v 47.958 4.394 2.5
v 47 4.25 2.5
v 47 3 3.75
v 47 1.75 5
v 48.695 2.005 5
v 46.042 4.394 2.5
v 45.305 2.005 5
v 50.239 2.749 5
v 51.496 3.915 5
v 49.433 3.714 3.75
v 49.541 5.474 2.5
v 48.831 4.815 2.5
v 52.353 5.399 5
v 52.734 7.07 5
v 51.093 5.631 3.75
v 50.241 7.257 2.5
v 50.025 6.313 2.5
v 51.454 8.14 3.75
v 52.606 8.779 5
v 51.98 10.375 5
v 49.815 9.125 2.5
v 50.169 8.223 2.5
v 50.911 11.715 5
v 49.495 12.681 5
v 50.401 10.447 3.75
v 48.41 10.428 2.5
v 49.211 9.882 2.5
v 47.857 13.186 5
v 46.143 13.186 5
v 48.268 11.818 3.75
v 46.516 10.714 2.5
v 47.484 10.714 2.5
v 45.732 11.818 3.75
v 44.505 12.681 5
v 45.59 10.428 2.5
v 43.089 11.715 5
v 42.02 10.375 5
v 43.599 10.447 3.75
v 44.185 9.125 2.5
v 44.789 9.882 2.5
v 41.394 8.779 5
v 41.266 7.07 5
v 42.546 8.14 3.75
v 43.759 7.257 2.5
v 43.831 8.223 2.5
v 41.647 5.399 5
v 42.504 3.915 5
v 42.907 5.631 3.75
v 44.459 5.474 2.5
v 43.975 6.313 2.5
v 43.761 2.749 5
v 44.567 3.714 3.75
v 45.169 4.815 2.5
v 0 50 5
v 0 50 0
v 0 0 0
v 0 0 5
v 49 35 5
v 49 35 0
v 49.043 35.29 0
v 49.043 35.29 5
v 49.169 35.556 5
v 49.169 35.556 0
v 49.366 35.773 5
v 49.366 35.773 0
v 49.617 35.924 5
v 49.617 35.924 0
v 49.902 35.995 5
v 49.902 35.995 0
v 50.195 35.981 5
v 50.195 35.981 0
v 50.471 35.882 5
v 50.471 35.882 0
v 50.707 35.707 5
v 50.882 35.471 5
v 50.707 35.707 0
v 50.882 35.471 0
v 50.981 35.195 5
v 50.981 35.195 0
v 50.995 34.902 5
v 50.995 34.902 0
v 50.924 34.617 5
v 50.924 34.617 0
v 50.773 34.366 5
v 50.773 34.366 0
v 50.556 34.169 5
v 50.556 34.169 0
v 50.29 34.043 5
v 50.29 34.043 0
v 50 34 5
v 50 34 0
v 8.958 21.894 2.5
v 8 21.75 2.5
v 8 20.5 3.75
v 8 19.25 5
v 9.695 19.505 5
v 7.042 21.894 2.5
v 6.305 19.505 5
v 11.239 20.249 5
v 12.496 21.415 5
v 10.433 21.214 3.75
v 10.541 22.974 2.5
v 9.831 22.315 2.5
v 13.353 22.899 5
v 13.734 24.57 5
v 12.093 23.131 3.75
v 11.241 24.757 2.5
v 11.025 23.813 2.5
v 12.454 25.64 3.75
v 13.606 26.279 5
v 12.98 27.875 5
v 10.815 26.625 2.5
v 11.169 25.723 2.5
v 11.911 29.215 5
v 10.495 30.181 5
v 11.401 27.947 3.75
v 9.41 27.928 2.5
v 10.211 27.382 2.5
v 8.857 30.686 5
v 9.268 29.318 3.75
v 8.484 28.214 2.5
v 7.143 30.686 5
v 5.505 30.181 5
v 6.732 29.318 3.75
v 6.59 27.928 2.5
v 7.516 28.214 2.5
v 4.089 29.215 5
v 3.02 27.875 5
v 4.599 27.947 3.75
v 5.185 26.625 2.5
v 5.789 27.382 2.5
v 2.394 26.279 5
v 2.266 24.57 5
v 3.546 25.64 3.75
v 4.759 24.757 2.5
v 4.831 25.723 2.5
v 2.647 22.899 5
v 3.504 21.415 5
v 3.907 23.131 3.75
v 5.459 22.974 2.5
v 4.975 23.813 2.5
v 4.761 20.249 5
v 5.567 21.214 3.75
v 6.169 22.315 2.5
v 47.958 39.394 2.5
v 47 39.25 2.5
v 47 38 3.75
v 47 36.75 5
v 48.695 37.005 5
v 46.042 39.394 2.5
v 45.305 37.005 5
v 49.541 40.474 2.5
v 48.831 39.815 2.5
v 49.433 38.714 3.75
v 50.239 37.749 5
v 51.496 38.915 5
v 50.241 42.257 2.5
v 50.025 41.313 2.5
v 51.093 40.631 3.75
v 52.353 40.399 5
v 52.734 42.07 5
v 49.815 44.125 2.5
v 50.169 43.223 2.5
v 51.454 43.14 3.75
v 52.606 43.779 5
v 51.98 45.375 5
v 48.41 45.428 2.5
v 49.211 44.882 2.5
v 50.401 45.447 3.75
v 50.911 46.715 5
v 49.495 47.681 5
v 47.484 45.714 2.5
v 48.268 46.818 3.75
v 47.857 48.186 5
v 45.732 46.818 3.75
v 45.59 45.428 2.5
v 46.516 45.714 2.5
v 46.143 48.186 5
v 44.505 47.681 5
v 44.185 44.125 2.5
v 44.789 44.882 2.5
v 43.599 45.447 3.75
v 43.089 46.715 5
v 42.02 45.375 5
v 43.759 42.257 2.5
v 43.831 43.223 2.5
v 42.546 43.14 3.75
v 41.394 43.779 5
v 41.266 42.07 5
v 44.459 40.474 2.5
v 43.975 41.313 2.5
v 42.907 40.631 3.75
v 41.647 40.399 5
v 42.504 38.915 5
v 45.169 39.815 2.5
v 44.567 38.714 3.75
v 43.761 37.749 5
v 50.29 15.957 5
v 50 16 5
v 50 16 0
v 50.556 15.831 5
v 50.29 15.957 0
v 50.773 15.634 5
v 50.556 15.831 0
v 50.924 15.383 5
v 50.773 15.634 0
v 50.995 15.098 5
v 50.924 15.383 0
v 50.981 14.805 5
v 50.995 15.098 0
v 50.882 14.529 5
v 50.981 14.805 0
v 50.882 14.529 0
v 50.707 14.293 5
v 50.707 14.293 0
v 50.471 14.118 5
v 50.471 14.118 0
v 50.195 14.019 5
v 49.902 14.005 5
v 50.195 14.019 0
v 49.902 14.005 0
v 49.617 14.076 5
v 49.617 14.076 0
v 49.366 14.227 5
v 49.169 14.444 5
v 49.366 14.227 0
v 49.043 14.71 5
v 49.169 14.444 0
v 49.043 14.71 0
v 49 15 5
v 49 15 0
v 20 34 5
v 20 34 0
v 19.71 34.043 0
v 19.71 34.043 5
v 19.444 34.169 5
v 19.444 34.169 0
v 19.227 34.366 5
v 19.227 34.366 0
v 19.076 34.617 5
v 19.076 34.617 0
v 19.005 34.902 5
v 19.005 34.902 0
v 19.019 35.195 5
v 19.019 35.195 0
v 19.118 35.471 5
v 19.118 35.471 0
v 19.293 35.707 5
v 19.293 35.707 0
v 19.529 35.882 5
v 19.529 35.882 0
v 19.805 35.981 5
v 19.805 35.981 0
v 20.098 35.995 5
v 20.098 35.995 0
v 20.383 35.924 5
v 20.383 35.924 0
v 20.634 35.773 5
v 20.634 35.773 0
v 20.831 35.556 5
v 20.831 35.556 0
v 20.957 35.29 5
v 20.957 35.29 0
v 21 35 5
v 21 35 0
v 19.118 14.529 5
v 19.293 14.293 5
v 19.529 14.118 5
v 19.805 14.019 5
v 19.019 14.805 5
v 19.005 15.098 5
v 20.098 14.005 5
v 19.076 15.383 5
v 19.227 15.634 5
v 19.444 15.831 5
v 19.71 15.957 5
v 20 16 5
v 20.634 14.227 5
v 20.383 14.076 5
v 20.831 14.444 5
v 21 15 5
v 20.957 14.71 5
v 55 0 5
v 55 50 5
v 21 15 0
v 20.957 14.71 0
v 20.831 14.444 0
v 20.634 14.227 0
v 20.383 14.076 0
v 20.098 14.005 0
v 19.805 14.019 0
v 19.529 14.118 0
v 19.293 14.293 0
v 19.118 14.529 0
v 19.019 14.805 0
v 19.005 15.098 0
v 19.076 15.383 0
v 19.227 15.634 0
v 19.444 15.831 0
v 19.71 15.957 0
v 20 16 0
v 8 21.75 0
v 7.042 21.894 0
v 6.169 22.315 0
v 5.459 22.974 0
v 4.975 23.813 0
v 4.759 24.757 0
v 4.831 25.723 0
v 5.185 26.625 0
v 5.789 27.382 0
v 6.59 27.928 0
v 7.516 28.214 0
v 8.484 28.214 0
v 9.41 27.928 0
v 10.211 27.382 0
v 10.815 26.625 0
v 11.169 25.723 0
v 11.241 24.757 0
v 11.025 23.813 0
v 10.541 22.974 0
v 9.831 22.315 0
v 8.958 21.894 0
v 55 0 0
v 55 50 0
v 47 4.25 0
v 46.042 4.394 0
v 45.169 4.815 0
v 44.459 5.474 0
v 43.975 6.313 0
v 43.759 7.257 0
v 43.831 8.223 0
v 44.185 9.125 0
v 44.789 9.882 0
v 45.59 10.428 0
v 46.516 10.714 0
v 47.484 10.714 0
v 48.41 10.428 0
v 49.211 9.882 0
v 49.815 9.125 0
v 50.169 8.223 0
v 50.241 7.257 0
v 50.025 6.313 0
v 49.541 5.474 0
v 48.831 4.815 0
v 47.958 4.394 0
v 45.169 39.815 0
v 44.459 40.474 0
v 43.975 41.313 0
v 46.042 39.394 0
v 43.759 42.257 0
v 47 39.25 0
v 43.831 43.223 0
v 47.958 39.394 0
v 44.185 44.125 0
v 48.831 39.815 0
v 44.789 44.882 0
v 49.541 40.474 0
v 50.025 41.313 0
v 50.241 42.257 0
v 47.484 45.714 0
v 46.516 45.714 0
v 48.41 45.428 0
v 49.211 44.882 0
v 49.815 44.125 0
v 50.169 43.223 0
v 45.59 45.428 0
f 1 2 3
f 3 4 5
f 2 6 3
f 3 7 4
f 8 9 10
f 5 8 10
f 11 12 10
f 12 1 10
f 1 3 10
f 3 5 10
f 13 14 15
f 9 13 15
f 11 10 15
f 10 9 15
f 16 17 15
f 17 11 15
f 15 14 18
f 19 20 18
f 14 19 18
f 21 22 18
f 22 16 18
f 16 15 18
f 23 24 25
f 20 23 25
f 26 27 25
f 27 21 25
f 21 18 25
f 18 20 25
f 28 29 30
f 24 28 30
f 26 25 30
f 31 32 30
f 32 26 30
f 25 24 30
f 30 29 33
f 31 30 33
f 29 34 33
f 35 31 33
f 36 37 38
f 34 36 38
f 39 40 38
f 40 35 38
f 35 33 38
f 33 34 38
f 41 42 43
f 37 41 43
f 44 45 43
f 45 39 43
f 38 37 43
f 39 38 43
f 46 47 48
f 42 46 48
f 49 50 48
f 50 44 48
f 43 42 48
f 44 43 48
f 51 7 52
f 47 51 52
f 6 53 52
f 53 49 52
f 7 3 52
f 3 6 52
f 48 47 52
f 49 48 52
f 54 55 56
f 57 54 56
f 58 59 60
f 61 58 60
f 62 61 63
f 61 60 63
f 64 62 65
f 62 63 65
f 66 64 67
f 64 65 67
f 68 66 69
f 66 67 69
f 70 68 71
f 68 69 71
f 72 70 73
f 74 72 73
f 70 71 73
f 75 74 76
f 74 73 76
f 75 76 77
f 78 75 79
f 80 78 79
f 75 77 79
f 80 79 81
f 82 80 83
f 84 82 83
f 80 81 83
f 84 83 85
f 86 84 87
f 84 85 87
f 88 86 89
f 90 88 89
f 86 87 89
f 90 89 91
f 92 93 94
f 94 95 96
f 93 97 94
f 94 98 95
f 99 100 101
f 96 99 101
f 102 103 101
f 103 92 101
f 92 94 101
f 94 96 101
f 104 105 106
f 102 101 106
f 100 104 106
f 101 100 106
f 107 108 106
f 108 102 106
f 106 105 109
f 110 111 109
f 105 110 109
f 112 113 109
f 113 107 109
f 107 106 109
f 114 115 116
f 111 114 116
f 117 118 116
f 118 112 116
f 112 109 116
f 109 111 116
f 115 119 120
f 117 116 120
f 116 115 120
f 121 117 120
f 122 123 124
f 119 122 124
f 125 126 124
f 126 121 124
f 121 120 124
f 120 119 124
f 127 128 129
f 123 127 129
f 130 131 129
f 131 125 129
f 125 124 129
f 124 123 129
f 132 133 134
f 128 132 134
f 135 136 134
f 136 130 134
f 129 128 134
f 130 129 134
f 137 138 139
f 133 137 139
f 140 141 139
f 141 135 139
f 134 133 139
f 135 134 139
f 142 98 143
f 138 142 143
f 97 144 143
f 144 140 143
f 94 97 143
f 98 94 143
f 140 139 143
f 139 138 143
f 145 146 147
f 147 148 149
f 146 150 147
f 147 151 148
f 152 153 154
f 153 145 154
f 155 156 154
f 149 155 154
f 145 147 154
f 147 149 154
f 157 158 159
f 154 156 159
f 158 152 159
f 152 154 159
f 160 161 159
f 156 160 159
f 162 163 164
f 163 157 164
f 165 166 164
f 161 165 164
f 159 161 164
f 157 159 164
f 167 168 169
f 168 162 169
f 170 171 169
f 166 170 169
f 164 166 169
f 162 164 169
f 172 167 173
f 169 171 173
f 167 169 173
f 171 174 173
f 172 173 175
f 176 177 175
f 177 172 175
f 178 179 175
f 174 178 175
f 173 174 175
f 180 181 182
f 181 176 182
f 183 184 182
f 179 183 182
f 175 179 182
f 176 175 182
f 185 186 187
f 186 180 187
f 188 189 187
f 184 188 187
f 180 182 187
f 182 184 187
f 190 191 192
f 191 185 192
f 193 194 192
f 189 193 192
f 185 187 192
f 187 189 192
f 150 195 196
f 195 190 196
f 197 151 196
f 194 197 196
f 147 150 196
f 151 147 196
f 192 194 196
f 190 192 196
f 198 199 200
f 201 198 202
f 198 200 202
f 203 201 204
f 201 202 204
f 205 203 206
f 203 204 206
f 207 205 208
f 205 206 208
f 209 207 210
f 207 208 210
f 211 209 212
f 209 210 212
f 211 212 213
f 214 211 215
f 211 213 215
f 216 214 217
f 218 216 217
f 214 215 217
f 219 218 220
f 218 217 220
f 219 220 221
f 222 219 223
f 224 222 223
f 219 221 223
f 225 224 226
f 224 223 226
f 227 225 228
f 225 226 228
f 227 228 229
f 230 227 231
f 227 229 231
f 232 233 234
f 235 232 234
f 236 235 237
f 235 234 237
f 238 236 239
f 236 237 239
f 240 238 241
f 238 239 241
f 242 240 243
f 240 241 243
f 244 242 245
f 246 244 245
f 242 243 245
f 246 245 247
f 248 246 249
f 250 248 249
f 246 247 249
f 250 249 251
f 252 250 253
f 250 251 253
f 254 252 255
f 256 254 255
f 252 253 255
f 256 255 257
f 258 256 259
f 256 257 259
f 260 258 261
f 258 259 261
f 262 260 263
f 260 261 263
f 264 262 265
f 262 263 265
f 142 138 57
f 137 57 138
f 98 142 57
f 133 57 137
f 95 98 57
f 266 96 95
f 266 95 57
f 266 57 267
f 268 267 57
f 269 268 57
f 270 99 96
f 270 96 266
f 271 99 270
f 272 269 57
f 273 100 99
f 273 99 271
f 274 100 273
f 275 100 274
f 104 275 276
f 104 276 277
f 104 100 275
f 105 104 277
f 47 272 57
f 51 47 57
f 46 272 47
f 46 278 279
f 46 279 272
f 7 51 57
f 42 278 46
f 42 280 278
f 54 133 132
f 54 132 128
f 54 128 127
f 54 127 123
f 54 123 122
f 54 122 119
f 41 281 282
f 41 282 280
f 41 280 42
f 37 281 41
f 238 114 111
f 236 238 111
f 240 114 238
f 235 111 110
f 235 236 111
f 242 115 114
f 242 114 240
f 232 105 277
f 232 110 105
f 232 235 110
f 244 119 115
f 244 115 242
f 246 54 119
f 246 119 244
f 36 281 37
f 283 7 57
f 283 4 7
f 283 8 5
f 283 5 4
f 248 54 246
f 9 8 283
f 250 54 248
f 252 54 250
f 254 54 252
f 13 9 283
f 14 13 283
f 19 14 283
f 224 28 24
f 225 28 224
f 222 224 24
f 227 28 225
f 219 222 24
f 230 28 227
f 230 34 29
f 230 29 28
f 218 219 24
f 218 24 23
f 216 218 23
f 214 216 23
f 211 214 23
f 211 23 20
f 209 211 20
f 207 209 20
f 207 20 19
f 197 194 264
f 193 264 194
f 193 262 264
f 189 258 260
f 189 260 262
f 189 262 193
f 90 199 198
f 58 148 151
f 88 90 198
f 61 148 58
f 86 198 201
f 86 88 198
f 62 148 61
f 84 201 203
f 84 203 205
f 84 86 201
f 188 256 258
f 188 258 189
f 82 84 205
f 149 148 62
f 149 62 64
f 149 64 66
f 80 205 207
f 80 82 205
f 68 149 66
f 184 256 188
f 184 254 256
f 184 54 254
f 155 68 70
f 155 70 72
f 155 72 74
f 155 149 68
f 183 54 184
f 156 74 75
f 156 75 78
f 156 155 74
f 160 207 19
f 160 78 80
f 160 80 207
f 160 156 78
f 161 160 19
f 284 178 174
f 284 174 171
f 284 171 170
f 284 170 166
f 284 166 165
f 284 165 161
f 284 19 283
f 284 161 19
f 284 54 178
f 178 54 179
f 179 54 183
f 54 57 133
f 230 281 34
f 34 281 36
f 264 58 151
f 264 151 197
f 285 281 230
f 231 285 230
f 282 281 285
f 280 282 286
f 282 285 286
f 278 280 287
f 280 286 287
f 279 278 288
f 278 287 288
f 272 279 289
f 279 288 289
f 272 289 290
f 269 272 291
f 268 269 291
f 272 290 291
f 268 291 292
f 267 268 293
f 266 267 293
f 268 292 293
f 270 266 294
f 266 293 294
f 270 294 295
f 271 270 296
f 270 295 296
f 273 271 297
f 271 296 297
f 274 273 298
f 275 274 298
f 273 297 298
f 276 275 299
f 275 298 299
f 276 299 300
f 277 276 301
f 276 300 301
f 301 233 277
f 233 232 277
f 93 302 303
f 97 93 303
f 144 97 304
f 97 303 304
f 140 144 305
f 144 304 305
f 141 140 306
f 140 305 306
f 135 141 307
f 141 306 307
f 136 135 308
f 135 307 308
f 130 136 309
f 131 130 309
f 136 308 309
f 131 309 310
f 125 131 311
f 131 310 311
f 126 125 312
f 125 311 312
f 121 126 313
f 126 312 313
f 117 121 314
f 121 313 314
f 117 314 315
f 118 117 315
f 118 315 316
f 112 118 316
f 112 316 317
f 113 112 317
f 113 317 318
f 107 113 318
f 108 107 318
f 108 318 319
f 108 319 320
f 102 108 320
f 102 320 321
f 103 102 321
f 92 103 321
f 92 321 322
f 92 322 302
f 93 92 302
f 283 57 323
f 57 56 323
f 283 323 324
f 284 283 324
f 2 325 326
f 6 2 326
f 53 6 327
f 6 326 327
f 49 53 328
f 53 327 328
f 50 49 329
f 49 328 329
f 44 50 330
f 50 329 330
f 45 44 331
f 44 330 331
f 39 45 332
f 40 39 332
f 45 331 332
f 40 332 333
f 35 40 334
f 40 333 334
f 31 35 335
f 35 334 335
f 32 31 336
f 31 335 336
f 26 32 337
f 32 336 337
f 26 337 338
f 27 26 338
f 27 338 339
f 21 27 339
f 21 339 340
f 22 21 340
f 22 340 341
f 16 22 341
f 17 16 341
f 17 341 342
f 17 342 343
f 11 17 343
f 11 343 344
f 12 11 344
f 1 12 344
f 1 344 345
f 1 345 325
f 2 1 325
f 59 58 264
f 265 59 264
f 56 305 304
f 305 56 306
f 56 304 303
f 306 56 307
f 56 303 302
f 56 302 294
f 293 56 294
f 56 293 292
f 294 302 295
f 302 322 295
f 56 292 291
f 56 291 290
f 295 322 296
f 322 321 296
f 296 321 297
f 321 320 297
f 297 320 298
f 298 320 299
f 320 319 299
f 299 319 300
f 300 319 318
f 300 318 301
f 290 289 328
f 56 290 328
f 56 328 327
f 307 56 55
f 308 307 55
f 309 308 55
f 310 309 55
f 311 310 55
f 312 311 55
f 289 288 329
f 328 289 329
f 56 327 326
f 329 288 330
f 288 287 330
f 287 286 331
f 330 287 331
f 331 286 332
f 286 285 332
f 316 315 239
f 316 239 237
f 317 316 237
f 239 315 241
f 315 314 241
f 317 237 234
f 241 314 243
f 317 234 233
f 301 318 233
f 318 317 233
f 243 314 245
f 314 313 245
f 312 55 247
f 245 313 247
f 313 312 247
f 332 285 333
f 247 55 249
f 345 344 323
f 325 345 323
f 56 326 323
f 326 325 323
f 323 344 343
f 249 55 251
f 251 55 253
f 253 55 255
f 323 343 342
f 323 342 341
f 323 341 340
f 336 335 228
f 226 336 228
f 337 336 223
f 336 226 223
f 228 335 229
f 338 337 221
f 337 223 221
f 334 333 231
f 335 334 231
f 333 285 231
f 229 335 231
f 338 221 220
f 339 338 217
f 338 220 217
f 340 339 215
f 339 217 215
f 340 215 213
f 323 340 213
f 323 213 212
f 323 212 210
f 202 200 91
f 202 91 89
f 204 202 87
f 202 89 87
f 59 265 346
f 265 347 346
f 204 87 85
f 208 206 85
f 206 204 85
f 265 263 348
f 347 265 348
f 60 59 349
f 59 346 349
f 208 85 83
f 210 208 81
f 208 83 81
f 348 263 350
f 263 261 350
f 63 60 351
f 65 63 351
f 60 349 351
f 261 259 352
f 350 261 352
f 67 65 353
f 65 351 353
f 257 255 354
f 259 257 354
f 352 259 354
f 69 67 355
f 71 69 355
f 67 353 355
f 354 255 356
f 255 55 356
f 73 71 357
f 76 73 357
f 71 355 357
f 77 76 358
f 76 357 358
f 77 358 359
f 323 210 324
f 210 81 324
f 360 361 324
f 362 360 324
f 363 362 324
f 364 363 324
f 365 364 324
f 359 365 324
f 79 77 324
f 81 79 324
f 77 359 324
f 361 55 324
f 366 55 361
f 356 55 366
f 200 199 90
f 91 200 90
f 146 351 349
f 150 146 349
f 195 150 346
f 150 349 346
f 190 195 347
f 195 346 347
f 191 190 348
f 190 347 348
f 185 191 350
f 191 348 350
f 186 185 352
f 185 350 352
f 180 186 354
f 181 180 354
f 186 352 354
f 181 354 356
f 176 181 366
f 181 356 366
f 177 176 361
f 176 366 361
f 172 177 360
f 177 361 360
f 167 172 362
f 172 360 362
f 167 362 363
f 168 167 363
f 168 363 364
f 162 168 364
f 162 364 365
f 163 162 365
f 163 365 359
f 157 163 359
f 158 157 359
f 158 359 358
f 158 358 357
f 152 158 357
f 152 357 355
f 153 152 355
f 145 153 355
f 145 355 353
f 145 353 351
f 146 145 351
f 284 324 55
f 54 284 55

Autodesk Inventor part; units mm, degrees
ref_plane "YZ Plane" through (0, 0, 0) normal (1, 0, 0) x (0, 1, 0)
ref_plane "XZ Plane" through (0, 0, 0) normal (0, 1, 0) x (-1, 0, 0)
ref_plane "XY Plane" through (0, 0, 0) normal (0, 0, 1) x (1, 0, 0)
sketch "Sketch1" plane through (0, 0, 0) normal (0, 0, 1) x (1, 0, 0)
  line L0 (0, 0) -> (55, 0)
  line L1 (55, 0) -> (55, 50)
  line L2 (55, 50) -> (0, 50)
  line L3 (0, 50) -> (0, 0)
  dimension "d0" = 55
  dimension "d1" = 50
extrude "Extrusion1" add sketch "Sketch1" along normal blind 5
sketch "Sketch2" plane through (0, 0, 5) normal (0, 0, 1) x (1, 0, 0)
  line L0 (55, 0) -> (0, 0) projected
  line L1 (55, 50) -> (55, 0) projected
  line L2 (20, 15) -> (50, 15)
  line L3 (50, 15) -> (50, 35)
  line L4 (50, 35) -> (20, 35)
  line L5 (20, 35) -> (20, 15)
  dimension "d4" = 30
  dimension "d5" = 20
  dimension "d6" = 5
  dimension "d7" = 15
extrude "Extrusion2" cut sketch "Sketch2" against normal blind 5
sketch "Sketch3" plane through (0, 0, 5) normal (0, 0, 1) x (1, 0, 0)
  circle A0 centre (20, 35) radius 1
  circle A1 centre (20, 15) radius 1
  circle A2 centre (50, 15) radius 1
  circle A3 centre (50, 35) radius 1
  point P0 (50, 35)
  point P1 (20, 15)
  dimension "d10" = 2
  dimension "d11" = 2
  dimension "d12" = 2
  dimension "d13" = 2
hole "Hole1" at (20, 35, 5) at (20, 15, 5) at (50, 15, 5) at (50, 35, 5) direction (0, 0, -1) diameter 2 depth 5 tip angle 118
sketch "Sketch4" plane through (0, 0, 5) normal (0, 0, 1) x (1, 0, 0)
  line L0 (0, 0) -> (0, 50) projected
  line L1 (55, 0) -> (0, 0) projected
  line L2 (55, 50) -> (55, 0) projected
  line L3 (0, 50) -> (55, 50) projected
  point P0 (8, 25)
  point P1 (47, 42.5)
  point P2 (47, 7.5)
  dimension "d21" = 35
  dimension "d22" = 7.5
  dimension "d23" = 8
  dimension "d24" = 8
  dimension "d25" = 8
  dimension "d26" = 25
hole "Hole2" at (8, 25, 5) at (47, 42.5, 5) at (47, 7.5, 5) direction (0, 0, -1) diameter 6.5 depth 5 tip angle 118 countersink diameter 11.5 countersink angle 90
properties part number "ASSOALHO(8)" material "Carbon Steel"
